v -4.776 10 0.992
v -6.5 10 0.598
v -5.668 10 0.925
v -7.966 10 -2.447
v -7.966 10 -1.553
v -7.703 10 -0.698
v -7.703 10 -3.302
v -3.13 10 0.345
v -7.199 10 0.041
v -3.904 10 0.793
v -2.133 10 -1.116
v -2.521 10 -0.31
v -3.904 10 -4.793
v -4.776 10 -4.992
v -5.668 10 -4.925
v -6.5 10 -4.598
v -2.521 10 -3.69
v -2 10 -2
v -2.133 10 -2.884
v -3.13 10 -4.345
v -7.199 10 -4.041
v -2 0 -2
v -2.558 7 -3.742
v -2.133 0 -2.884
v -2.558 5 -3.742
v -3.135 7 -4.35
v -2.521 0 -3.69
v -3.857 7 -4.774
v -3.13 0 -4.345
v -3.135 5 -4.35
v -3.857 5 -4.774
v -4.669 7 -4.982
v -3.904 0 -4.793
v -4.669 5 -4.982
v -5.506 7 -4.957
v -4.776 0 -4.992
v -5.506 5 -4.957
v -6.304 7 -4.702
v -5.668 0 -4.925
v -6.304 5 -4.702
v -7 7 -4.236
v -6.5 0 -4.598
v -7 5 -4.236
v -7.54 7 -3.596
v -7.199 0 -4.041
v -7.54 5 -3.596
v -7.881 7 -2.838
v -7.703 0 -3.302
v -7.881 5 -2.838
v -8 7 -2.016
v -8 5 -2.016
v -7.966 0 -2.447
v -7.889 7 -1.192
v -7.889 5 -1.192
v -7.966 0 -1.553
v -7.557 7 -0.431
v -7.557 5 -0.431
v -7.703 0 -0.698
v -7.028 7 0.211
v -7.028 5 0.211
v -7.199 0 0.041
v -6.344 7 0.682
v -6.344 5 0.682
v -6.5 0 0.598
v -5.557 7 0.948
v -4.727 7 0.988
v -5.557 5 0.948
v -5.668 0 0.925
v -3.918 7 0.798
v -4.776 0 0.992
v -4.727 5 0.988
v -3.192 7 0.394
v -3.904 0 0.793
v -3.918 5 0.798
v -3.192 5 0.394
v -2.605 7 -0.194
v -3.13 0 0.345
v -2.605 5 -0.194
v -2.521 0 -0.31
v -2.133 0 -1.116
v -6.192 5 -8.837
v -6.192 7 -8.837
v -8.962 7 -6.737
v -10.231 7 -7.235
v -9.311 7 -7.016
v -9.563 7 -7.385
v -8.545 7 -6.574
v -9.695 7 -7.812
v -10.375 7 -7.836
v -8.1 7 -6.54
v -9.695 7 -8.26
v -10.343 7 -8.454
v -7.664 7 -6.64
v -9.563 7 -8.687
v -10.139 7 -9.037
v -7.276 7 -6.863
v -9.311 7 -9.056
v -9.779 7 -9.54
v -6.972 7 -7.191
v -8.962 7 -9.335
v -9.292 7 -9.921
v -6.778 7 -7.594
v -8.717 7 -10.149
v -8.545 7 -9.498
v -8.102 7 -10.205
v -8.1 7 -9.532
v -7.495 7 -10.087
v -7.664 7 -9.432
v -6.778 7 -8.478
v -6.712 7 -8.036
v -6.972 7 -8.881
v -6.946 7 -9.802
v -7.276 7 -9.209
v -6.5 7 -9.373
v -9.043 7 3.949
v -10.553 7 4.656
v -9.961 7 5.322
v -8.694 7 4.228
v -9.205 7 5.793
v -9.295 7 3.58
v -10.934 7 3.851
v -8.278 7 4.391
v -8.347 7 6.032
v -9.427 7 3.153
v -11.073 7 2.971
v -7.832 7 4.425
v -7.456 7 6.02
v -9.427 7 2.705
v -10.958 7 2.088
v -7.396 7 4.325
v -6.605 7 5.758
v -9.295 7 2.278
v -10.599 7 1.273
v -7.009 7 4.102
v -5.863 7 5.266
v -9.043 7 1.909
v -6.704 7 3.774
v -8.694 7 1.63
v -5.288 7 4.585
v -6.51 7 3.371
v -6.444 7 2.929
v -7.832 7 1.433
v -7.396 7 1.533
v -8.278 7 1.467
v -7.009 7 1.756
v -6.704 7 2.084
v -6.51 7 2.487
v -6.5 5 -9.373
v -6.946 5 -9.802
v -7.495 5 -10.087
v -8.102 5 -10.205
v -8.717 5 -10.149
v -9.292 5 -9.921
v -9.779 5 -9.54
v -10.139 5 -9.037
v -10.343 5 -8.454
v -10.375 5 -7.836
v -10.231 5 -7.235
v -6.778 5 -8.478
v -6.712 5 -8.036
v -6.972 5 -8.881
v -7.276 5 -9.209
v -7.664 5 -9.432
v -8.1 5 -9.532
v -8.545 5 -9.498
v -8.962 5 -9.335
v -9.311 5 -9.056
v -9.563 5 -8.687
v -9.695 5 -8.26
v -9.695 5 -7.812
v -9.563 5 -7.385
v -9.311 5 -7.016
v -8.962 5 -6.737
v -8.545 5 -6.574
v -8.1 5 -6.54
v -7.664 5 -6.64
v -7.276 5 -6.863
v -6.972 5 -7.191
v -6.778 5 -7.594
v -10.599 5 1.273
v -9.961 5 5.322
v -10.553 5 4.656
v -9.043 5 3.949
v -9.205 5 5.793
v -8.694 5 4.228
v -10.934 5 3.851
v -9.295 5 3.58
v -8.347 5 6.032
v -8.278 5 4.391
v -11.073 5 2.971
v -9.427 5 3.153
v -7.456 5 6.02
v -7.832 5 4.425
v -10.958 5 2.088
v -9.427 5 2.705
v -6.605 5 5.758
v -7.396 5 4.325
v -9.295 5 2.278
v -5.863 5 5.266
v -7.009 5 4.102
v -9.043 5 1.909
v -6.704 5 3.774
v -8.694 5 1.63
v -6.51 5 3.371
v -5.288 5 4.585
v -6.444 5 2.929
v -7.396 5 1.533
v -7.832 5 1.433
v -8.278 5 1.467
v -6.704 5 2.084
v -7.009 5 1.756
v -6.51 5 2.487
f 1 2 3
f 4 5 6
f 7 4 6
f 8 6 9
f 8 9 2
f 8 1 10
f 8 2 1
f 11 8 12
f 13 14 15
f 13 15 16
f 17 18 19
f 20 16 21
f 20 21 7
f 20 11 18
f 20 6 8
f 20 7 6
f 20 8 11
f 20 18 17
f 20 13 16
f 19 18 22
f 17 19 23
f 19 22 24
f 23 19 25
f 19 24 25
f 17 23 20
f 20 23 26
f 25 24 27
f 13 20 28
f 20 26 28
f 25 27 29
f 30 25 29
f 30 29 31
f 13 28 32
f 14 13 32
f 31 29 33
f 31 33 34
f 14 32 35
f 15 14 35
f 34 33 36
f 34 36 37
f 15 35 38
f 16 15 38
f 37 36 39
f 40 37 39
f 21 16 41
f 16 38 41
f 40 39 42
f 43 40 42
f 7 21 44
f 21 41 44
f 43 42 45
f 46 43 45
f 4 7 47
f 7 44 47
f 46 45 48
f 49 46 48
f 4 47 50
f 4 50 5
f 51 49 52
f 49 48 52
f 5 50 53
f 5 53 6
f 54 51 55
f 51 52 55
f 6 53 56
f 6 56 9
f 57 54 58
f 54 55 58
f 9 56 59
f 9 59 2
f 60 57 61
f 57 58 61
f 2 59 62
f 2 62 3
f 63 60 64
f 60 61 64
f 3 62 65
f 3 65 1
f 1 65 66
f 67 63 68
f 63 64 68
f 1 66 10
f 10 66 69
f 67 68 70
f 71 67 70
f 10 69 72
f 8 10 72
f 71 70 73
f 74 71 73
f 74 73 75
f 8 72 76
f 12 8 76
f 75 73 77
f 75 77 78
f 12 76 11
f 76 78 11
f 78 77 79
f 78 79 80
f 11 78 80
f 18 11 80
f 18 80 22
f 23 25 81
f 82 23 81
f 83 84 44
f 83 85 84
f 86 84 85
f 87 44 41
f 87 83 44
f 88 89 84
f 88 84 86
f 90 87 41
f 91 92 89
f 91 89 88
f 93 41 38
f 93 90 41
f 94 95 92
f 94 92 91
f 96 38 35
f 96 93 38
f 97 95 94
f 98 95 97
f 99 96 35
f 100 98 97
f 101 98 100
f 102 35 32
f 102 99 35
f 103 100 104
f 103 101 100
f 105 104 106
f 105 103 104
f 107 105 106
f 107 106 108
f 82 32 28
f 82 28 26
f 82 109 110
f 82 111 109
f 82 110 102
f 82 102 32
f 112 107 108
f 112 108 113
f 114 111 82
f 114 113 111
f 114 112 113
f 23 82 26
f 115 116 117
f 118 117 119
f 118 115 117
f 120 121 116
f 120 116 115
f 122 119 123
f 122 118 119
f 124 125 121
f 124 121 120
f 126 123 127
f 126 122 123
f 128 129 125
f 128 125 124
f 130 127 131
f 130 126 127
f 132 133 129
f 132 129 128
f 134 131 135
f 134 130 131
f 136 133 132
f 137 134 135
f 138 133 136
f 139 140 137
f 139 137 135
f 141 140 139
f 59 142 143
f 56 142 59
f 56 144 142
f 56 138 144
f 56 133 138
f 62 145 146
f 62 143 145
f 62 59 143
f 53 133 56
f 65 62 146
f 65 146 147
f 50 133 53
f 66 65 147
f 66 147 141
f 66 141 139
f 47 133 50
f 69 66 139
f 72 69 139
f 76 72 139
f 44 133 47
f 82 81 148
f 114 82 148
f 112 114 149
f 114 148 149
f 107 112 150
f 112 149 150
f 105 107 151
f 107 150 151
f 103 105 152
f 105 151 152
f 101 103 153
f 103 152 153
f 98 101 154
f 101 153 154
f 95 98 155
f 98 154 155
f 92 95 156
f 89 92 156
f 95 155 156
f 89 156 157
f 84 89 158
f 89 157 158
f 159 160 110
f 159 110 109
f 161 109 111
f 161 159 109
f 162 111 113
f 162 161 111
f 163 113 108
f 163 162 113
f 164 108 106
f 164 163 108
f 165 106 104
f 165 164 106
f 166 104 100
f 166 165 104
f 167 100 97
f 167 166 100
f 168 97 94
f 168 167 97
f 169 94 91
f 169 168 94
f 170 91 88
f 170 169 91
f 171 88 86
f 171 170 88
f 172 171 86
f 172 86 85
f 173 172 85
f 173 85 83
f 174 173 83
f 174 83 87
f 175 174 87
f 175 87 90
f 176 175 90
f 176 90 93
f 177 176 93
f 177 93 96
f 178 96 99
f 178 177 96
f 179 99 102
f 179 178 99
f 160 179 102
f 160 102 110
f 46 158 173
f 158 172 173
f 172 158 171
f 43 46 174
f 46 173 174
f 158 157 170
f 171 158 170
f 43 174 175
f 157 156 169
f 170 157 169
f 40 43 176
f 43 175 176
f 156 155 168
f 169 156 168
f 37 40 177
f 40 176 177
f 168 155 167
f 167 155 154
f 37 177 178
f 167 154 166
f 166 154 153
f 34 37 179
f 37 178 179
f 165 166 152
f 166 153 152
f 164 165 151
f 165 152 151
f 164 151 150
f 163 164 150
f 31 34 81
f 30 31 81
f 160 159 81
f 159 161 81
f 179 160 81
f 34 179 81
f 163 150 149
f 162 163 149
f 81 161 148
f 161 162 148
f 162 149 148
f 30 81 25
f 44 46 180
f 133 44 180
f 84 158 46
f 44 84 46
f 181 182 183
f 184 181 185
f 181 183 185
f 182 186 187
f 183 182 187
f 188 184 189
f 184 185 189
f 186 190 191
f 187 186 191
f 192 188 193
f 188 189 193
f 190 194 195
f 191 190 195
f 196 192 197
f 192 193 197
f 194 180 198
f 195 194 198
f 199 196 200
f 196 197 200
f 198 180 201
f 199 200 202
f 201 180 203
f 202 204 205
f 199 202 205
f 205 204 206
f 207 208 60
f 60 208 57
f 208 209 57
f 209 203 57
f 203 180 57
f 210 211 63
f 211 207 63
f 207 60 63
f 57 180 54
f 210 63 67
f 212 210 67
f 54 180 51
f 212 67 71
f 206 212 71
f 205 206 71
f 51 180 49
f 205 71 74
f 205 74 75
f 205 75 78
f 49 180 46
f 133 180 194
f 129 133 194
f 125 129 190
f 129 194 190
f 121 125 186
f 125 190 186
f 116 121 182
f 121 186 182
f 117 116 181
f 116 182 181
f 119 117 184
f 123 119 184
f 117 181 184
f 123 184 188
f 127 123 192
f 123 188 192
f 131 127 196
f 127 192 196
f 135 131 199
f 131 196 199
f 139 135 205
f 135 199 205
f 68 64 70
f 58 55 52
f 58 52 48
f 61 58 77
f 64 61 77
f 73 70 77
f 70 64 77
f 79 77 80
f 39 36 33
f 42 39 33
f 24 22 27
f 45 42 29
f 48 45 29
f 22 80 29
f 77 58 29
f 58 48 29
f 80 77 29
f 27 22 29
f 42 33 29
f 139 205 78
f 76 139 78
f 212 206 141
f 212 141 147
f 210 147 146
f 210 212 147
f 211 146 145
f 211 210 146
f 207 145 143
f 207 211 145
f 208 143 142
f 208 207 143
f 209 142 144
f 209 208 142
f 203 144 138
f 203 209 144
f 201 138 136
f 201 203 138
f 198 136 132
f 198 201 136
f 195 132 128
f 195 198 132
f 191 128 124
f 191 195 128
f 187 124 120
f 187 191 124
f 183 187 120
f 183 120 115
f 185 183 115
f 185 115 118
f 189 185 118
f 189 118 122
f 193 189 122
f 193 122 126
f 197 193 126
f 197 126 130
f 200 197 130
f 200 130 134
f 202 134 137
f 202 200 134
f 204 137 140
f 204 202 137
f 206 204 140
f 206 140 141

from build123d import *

# Parameters (mm, degrees)
BOSS_EXTRUDE1_DEPTH = 10
BOSS_EXTRUDE2_START = 5
SKETCH1_3_R         = 1.5
BOSS_EXTRUDE2_DEPTH = 2


with BuildPart() as part:
    # Sketch1 → Boss-Extrude1 (new body)
    with BuildSketch(Plane(origin=(0, 0, 0), x_dir=(1, 0, 0), z_dir=(0, 1, 0))):
        with BuildLine():
            ThreePointArc((-2.557799528, 3.74231365), (-5.08812745, 4.998705313), (-7.54030513, 3.595885286))
            ThreePointArc((-7.54030513, 3.595885286), (-6.702483219, -0.470131755), (-2.604511851, 0.193999854))
            ThreePointArc((-2.604511851, 0.193999854), (-2.155139331, 1.047756451), (-2, 2))
            ThreePointArc((-2, 2), (-2.142850947, 2.914712683), (-2.557799528, 3.74231365))
        make_face()
    extrude(amount=BOSS_EXTRUDE1_DEPTH)

    # Sketch1<3> → Boss-Extrude2 (add)
    # profile 1 of 2: a face of its own
    with BuildSketch(Plane(origin=(0, 0, 0), x_dir=(1, 0, 0), z_dir=(0, 1, 0)).offset(BOSS_EXTRUDE2_START)):
        with BuildLine():
            ThreePointArc((-2.604511851, 0.193999854), (-6.702483219, -0.470131755), (-7.54030513, 3.595885286))
            Line((-7.54030513, 3.595885286), (-10.599067222, -1.273004164))
            ThreePointArc((-10.599067222, -1.273004164), (-9.599794928, -5.584355236), (-5.288443855, -4.585082942))
            Line((-5.288443855, -4.585082942), (-2.604511851, 0.193999854))
        make_face()
        with Locations((-7.943755539, -2.929043553)):
            Circle(SKETCH1_3_R, mode=Mode.SUBTRACT)
    # profile 2 of 2: a face of its own
    with BuildSketch(Plane(origin=(0, 0, 0), x_dir=(1, 0, 0), z_dir=(0, 1, 0)).offset(BOSS_EXTRUDE2_START)):
        with BuildLine():
            Line((-10.230926638, 7.234880355), (-7.54030513, 3.595885286))
            ThreePointArc((-7.54030513, 3.595885286), (-5.08812745, 4.998705313), (-2.557799528, 3.74231365))
            Line((-2.557799528, 3.74231365), (-6.192479387, 8.837043218))
            ThreePointArc((-6.192479387, 8.837043218), (-9.012784444, 10.055185412), (-10.230926638, 7.234880355))
        make_face()
        with Locations((-8.211703012, 8.035961786)):
            Circle(SKETCH1_3_R, mode=Mode.SUBTRACT)
    extrude(amount=BOSS_EXTRUDE2_DEPTH)


solid = part.part
